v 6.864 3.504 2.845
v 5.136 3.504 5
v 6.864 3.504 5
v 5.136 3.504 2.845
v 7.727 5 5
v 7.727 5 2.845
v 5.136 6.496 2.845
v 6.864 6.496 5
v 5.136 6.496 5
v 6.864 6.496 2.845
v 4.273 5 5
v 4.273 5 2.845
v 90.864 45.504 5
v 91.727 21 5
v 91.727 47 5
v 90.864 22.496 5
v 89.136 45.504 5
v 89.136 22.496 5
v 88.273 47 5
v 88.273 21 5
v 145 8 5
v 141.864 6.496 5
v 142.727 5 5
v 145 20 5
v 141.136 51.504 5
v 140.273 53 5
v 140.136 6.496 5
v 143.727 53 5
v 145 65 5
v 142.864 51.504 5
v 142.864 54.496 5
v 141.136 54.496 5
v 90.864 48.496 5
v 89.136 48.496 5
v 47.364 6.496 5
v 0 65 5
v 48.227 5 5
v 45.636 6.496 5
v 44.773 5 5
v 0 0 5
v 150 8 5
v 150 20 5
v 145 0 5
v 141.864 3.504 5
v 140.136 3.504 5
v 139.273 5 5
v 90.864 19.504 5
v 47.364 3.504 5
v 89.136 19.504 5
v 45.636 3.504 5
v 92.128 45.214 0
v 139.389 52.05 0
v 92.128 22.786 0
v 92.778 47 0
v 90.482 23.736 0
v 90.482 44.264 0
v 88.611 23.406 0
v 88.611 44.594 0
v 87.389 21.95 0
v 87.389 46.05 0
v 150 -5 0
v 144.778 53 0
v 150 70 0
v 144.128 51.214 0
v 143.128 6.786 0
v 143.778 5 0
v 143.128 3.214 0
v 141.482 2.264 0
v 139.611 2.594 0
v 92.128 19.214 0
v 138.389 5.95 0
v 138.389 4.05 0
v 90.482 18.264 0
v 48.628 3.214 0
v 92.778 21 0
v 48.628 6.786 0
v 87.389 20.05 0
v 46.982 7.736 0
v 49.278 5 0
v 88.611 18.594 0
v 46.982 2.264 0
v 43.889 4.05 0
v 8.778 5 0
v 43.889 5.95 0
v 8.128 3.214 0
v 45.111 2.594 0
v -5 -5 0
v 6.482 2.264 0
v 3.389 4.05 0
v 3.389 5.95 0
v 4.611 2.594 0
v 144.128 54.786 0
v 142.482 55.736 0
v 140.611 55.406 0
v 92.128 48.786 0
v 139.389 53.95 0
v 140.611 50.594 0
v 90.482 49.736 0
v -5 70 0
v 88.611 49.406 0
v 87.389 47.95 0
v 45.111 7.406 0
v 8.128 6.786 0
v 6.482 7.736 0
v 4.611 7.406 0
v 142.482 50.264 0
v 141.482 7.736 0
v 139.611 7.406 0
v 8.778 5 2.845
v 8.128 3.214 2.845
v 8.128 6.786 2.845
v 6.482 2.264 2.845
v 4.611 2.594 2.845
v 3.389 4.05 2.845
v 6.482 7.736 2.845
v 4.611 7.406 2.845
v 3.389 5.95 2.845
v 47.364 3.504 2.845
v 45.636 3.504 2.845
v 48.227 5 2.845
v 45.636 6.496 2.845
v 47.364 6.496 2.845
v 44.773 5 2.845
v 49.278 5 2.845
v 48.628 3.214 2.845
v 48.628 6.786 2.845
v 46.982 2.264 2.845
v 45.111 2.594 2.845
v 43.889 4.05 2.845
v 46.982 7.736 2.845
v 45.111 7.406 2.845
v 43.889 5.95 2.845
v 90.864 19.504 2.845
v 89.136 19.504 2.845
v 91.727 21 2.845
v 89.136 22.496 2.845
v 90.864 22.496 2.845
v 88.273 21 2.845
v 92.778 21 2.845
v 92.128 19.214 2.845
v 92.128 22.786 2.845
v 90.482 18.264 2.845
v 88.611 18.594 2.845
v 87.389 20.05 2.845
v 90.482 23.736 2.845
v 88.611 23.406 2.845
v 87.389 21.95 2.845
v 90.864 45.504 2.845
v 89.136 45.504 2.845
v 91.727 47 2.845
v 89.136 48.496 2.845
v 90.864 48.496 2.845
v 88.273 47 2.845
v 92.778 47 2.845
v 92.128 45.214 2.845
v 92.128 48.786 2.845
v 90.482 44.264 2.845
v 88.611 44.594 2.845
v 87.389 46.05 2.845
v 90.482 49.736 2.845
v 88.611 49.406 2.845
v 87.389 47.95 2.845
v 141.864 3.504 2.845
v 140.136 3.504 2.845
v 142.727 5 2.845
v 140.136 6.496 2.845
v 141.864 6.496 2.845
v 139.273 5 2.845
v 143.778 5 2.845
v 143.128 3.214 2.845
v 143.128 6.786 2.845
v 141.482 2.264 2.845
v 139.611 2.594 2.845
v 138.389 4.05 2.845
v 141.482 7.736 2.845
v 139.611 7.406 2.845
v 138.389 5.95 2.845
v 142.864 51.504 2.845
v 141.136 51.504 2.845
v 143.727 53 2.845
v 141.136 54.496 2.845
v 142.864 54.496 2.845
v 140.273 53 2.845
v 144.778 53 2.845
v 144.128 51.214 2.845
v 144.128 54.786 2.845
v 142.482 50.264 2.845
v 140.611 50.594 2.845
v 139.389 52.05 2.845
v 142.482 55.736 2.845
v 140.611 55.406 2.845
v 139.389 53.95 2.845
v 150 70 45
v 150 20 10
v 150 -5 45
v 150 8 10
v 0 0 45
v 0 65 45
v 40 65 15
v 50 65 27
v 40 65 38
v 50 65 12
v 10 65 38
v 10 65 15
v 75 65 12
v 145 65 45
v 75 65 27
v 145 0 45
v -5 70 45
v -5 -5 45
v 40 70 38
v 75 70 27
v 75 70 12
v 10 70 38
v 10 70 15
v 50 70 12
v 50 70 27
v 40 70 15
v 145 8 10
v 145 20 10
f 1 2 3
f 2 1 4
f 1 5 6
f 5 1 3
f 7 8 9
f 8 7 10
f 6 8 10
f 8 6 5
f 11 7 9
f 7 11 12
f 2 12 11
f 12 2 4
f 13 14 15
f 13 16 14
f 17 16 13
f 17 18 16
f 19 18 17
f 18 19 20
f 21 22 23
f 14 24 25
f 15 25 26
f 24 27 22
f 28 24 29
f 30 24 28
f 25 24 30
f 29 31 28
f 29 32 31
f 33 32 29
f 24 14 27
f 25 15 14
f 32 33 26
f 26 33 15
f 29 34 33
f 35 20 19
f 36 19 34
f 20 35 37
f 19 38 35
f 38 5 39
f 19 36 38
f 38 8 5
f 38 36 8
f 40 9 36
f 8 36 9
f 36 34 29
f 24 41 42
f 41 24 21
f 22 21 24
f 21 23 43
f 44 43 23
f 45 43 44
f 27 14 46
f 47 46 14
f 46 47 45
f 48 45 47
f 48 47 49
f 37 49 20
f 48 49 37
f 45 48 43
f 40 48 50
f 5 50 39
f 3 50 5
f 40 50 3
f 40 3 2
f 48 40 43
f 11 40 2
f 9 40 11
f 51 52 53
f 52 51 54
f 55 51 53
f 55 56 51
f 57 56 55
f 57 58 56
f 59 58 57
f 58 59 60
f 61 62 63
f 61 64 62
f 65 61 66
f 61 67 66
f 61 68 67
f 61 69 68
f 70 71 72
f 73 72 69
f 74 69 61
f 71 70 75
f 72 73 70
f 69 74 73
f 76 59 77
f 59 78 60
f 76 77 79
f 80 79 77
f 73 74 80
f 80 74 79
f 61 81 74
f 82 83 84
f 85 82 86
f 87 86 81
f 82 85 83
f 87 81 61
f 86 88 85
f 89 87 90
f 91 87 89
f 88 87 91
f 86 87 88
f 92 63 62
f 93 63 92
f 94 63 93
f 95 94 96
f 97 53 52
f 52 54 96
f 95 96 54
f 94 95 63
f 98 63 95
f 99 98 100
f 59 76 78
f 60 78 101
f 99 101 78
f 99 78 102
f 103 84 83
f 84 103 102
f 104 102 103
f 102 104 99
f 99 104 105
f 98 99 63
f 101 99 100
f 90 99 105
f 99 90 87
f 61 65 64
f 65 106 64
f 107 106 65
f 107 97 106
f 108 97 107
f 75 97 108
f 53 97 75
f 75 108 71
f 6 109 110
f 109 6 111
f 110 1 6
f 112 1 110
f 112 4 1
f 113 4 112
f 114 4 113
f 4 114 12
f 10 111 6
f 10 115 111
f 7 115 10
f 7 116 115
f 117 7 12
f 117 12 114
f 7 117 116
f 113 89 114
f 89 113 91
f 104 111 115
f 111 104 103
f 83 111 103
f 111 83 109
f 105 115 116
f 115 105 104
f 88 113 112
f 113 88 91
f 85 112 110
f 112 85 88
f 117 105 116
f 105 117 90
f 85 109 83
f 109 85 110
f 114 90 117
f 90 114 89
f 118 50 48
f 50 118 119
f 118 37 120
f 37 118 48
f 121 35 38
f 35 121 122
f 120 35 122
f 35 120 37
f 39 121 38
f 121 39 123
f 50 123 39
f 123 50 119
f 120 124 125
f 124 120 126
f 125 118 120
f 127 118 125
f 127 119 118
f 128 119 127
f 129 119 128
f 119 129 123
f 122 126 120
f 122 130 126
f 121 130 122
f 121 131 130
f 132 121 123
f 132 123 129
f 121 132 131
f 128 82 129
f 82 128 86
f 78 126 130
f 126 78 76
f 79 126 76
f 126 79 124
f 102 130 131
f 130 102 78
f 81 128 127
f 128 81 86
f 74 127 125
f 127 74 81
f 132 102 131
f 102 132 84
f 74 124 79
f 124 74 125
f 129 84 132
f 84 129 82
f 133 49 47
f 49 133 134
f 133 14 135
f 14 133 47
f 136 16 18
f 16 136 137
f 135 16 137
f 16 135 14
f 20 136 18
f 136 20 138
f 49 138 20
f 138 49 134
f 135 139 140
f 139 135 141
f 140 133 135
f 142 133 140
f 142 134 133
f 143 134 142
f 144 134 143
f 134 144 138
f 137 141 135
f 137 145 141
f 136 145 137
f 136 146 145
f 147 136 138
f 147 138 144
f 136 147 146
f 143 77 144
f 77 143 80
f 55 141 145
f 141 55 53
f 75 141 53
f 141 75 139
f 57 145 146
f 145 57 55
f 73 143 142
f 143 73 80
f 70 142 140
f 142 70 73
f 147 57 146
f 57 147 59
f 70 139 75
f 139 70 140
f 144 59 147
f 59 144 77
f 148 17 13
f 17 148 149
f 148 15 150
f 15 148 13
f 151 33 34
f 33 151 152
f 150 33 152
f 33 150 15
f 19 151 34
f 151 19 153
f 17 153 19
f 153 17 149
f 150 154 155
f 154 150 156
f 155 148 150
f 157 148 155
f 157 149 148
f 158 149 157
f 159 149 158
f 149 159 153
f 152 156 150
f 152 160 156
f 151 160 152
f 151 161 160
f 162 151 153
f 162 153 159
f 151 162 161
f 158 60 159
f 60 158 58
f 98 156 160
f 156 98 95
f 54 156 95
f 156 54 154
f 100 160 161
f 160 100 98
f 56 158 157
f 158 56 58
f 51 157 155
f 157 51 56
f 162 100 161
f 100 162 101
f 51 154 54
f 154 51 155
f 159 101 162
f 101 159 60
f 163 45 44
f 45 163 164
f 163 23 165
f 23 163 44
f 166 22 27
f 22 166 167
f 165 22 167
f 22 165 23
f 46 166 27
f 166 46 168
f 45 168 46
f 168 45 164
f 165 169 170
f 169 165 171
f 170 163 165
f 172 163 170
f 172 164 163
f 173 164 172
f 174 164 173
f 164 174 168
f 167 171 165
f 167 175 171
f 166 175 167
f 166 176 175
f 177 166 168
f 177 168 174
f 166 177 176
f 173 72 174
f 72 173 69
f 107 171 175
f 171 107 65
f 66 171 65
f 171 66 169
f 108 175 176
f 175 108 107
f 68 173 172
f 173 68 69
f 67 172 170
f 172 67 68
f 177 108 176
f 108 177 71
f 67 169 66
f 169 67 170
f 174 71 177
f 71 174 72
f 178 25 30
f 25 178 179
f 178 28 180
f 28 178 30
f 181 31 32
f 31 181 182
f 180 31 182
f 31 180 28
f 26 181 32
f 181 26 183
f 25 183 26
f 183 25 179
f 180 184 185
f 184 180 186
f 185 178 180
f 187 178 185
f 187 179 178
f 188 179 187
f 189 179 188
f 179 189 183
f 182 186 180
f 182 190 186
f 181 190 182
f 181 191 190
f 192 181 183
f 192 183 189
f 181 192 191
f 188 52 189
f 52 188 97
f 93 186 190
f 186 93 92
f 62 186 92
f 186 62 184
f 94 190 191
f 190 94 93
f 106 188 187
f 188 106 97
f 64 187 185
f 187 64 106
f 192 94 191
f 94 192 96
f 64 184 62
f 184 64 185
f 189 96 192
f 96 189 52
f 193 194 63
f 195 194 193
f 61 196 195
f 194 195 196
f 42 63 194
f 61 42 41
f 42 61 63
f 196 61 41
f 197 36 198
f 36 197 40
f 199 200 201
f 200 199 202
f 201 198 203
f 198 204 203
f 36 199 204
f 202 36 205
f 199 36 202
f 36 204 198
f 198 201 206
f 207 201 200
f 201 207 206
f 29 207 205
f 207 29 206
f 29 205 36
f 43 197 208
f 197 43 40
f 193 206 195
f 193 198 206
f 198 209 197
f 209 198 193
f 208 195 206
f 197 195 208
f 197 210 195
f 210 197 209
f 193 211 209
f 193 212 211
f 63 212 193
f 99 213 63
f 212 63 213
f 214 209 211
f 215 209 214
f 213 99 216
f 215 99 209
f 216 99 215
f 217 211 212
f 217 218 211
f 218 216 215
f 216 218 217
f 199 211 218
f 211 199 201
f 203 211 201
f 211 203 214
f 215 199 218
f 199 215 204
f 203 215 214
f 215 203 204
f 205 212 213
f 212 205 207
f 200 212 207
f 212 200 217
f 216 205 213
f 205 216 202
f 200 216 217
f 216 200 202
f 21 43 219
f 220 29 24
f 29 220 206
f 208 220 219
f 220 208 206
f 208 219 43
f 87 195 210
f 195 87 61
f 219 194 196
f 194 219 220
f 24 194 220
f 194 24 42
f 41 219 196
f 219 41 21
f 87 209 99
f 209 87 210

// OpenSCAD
baseHeight =5;

wallHeight = 45;

baseWidth = 60;

baseLength = 150;

gapz = 5;
gapy = 22;

shft=5; // shift holes away from y = 0 this amount 

module fourForty ()   // countersunk no 4-40 bolt
{
cylinder(r = (0.136*25.4/2), h = baseHeight);
cylinder(r=(0.21875*25.4/2), h = (0.112*25.4));
} // number 4-40 hex socket head cap screw coutersink

difference(){

cube([baseLength,baseWidth+shft,baseHeight],center=false);

translate([6,shft,0]) {fourForty();}

translate([46.5,shft,0]) {fourForty();}

translate([90,16+shft,0]) {fourForty();}

translate([90,42+shft,0]) {fourForty();}

translate([141,shft,0]) {fourForty();}

translate([142,48+shft,0]) {fourForty();}

}

translate([0,-baseHeight,0]){
cube([baseLength,baseHeight,wallHeight],center=false);
}

difference(){ // cutouts for wallplug and switch

translate([0,baseHeight+baseWidth,0]){
cube([baseLength,baseHeight,wallHeight],center=false);
}

translate([10,baseHeight+baseWidth,10+baseHeight]){
cube([30,baseHeight,23],center=false);
}

translate([50,baseHeight+baseWidth,7+baseHeight]){
cube([25,baseHeight,15],center=false);
}

}

translate([-baseHeight,-baseHeight,0]){
cube([baseHeight,baseWidth+3*baseHeight,wallHeight],center=false);
}

difference(){

translate([-baseHeight+baseLength,-baseHeight,0]){
cube([baseHeight,baseWidth+3*baseHeight,wallHeight],center=false);
}

translate([-baseHeight+baseLength,-baseHeight+8+shft,gapz]){
cube([baseHeight,12,gapz],center=false);
}

}
